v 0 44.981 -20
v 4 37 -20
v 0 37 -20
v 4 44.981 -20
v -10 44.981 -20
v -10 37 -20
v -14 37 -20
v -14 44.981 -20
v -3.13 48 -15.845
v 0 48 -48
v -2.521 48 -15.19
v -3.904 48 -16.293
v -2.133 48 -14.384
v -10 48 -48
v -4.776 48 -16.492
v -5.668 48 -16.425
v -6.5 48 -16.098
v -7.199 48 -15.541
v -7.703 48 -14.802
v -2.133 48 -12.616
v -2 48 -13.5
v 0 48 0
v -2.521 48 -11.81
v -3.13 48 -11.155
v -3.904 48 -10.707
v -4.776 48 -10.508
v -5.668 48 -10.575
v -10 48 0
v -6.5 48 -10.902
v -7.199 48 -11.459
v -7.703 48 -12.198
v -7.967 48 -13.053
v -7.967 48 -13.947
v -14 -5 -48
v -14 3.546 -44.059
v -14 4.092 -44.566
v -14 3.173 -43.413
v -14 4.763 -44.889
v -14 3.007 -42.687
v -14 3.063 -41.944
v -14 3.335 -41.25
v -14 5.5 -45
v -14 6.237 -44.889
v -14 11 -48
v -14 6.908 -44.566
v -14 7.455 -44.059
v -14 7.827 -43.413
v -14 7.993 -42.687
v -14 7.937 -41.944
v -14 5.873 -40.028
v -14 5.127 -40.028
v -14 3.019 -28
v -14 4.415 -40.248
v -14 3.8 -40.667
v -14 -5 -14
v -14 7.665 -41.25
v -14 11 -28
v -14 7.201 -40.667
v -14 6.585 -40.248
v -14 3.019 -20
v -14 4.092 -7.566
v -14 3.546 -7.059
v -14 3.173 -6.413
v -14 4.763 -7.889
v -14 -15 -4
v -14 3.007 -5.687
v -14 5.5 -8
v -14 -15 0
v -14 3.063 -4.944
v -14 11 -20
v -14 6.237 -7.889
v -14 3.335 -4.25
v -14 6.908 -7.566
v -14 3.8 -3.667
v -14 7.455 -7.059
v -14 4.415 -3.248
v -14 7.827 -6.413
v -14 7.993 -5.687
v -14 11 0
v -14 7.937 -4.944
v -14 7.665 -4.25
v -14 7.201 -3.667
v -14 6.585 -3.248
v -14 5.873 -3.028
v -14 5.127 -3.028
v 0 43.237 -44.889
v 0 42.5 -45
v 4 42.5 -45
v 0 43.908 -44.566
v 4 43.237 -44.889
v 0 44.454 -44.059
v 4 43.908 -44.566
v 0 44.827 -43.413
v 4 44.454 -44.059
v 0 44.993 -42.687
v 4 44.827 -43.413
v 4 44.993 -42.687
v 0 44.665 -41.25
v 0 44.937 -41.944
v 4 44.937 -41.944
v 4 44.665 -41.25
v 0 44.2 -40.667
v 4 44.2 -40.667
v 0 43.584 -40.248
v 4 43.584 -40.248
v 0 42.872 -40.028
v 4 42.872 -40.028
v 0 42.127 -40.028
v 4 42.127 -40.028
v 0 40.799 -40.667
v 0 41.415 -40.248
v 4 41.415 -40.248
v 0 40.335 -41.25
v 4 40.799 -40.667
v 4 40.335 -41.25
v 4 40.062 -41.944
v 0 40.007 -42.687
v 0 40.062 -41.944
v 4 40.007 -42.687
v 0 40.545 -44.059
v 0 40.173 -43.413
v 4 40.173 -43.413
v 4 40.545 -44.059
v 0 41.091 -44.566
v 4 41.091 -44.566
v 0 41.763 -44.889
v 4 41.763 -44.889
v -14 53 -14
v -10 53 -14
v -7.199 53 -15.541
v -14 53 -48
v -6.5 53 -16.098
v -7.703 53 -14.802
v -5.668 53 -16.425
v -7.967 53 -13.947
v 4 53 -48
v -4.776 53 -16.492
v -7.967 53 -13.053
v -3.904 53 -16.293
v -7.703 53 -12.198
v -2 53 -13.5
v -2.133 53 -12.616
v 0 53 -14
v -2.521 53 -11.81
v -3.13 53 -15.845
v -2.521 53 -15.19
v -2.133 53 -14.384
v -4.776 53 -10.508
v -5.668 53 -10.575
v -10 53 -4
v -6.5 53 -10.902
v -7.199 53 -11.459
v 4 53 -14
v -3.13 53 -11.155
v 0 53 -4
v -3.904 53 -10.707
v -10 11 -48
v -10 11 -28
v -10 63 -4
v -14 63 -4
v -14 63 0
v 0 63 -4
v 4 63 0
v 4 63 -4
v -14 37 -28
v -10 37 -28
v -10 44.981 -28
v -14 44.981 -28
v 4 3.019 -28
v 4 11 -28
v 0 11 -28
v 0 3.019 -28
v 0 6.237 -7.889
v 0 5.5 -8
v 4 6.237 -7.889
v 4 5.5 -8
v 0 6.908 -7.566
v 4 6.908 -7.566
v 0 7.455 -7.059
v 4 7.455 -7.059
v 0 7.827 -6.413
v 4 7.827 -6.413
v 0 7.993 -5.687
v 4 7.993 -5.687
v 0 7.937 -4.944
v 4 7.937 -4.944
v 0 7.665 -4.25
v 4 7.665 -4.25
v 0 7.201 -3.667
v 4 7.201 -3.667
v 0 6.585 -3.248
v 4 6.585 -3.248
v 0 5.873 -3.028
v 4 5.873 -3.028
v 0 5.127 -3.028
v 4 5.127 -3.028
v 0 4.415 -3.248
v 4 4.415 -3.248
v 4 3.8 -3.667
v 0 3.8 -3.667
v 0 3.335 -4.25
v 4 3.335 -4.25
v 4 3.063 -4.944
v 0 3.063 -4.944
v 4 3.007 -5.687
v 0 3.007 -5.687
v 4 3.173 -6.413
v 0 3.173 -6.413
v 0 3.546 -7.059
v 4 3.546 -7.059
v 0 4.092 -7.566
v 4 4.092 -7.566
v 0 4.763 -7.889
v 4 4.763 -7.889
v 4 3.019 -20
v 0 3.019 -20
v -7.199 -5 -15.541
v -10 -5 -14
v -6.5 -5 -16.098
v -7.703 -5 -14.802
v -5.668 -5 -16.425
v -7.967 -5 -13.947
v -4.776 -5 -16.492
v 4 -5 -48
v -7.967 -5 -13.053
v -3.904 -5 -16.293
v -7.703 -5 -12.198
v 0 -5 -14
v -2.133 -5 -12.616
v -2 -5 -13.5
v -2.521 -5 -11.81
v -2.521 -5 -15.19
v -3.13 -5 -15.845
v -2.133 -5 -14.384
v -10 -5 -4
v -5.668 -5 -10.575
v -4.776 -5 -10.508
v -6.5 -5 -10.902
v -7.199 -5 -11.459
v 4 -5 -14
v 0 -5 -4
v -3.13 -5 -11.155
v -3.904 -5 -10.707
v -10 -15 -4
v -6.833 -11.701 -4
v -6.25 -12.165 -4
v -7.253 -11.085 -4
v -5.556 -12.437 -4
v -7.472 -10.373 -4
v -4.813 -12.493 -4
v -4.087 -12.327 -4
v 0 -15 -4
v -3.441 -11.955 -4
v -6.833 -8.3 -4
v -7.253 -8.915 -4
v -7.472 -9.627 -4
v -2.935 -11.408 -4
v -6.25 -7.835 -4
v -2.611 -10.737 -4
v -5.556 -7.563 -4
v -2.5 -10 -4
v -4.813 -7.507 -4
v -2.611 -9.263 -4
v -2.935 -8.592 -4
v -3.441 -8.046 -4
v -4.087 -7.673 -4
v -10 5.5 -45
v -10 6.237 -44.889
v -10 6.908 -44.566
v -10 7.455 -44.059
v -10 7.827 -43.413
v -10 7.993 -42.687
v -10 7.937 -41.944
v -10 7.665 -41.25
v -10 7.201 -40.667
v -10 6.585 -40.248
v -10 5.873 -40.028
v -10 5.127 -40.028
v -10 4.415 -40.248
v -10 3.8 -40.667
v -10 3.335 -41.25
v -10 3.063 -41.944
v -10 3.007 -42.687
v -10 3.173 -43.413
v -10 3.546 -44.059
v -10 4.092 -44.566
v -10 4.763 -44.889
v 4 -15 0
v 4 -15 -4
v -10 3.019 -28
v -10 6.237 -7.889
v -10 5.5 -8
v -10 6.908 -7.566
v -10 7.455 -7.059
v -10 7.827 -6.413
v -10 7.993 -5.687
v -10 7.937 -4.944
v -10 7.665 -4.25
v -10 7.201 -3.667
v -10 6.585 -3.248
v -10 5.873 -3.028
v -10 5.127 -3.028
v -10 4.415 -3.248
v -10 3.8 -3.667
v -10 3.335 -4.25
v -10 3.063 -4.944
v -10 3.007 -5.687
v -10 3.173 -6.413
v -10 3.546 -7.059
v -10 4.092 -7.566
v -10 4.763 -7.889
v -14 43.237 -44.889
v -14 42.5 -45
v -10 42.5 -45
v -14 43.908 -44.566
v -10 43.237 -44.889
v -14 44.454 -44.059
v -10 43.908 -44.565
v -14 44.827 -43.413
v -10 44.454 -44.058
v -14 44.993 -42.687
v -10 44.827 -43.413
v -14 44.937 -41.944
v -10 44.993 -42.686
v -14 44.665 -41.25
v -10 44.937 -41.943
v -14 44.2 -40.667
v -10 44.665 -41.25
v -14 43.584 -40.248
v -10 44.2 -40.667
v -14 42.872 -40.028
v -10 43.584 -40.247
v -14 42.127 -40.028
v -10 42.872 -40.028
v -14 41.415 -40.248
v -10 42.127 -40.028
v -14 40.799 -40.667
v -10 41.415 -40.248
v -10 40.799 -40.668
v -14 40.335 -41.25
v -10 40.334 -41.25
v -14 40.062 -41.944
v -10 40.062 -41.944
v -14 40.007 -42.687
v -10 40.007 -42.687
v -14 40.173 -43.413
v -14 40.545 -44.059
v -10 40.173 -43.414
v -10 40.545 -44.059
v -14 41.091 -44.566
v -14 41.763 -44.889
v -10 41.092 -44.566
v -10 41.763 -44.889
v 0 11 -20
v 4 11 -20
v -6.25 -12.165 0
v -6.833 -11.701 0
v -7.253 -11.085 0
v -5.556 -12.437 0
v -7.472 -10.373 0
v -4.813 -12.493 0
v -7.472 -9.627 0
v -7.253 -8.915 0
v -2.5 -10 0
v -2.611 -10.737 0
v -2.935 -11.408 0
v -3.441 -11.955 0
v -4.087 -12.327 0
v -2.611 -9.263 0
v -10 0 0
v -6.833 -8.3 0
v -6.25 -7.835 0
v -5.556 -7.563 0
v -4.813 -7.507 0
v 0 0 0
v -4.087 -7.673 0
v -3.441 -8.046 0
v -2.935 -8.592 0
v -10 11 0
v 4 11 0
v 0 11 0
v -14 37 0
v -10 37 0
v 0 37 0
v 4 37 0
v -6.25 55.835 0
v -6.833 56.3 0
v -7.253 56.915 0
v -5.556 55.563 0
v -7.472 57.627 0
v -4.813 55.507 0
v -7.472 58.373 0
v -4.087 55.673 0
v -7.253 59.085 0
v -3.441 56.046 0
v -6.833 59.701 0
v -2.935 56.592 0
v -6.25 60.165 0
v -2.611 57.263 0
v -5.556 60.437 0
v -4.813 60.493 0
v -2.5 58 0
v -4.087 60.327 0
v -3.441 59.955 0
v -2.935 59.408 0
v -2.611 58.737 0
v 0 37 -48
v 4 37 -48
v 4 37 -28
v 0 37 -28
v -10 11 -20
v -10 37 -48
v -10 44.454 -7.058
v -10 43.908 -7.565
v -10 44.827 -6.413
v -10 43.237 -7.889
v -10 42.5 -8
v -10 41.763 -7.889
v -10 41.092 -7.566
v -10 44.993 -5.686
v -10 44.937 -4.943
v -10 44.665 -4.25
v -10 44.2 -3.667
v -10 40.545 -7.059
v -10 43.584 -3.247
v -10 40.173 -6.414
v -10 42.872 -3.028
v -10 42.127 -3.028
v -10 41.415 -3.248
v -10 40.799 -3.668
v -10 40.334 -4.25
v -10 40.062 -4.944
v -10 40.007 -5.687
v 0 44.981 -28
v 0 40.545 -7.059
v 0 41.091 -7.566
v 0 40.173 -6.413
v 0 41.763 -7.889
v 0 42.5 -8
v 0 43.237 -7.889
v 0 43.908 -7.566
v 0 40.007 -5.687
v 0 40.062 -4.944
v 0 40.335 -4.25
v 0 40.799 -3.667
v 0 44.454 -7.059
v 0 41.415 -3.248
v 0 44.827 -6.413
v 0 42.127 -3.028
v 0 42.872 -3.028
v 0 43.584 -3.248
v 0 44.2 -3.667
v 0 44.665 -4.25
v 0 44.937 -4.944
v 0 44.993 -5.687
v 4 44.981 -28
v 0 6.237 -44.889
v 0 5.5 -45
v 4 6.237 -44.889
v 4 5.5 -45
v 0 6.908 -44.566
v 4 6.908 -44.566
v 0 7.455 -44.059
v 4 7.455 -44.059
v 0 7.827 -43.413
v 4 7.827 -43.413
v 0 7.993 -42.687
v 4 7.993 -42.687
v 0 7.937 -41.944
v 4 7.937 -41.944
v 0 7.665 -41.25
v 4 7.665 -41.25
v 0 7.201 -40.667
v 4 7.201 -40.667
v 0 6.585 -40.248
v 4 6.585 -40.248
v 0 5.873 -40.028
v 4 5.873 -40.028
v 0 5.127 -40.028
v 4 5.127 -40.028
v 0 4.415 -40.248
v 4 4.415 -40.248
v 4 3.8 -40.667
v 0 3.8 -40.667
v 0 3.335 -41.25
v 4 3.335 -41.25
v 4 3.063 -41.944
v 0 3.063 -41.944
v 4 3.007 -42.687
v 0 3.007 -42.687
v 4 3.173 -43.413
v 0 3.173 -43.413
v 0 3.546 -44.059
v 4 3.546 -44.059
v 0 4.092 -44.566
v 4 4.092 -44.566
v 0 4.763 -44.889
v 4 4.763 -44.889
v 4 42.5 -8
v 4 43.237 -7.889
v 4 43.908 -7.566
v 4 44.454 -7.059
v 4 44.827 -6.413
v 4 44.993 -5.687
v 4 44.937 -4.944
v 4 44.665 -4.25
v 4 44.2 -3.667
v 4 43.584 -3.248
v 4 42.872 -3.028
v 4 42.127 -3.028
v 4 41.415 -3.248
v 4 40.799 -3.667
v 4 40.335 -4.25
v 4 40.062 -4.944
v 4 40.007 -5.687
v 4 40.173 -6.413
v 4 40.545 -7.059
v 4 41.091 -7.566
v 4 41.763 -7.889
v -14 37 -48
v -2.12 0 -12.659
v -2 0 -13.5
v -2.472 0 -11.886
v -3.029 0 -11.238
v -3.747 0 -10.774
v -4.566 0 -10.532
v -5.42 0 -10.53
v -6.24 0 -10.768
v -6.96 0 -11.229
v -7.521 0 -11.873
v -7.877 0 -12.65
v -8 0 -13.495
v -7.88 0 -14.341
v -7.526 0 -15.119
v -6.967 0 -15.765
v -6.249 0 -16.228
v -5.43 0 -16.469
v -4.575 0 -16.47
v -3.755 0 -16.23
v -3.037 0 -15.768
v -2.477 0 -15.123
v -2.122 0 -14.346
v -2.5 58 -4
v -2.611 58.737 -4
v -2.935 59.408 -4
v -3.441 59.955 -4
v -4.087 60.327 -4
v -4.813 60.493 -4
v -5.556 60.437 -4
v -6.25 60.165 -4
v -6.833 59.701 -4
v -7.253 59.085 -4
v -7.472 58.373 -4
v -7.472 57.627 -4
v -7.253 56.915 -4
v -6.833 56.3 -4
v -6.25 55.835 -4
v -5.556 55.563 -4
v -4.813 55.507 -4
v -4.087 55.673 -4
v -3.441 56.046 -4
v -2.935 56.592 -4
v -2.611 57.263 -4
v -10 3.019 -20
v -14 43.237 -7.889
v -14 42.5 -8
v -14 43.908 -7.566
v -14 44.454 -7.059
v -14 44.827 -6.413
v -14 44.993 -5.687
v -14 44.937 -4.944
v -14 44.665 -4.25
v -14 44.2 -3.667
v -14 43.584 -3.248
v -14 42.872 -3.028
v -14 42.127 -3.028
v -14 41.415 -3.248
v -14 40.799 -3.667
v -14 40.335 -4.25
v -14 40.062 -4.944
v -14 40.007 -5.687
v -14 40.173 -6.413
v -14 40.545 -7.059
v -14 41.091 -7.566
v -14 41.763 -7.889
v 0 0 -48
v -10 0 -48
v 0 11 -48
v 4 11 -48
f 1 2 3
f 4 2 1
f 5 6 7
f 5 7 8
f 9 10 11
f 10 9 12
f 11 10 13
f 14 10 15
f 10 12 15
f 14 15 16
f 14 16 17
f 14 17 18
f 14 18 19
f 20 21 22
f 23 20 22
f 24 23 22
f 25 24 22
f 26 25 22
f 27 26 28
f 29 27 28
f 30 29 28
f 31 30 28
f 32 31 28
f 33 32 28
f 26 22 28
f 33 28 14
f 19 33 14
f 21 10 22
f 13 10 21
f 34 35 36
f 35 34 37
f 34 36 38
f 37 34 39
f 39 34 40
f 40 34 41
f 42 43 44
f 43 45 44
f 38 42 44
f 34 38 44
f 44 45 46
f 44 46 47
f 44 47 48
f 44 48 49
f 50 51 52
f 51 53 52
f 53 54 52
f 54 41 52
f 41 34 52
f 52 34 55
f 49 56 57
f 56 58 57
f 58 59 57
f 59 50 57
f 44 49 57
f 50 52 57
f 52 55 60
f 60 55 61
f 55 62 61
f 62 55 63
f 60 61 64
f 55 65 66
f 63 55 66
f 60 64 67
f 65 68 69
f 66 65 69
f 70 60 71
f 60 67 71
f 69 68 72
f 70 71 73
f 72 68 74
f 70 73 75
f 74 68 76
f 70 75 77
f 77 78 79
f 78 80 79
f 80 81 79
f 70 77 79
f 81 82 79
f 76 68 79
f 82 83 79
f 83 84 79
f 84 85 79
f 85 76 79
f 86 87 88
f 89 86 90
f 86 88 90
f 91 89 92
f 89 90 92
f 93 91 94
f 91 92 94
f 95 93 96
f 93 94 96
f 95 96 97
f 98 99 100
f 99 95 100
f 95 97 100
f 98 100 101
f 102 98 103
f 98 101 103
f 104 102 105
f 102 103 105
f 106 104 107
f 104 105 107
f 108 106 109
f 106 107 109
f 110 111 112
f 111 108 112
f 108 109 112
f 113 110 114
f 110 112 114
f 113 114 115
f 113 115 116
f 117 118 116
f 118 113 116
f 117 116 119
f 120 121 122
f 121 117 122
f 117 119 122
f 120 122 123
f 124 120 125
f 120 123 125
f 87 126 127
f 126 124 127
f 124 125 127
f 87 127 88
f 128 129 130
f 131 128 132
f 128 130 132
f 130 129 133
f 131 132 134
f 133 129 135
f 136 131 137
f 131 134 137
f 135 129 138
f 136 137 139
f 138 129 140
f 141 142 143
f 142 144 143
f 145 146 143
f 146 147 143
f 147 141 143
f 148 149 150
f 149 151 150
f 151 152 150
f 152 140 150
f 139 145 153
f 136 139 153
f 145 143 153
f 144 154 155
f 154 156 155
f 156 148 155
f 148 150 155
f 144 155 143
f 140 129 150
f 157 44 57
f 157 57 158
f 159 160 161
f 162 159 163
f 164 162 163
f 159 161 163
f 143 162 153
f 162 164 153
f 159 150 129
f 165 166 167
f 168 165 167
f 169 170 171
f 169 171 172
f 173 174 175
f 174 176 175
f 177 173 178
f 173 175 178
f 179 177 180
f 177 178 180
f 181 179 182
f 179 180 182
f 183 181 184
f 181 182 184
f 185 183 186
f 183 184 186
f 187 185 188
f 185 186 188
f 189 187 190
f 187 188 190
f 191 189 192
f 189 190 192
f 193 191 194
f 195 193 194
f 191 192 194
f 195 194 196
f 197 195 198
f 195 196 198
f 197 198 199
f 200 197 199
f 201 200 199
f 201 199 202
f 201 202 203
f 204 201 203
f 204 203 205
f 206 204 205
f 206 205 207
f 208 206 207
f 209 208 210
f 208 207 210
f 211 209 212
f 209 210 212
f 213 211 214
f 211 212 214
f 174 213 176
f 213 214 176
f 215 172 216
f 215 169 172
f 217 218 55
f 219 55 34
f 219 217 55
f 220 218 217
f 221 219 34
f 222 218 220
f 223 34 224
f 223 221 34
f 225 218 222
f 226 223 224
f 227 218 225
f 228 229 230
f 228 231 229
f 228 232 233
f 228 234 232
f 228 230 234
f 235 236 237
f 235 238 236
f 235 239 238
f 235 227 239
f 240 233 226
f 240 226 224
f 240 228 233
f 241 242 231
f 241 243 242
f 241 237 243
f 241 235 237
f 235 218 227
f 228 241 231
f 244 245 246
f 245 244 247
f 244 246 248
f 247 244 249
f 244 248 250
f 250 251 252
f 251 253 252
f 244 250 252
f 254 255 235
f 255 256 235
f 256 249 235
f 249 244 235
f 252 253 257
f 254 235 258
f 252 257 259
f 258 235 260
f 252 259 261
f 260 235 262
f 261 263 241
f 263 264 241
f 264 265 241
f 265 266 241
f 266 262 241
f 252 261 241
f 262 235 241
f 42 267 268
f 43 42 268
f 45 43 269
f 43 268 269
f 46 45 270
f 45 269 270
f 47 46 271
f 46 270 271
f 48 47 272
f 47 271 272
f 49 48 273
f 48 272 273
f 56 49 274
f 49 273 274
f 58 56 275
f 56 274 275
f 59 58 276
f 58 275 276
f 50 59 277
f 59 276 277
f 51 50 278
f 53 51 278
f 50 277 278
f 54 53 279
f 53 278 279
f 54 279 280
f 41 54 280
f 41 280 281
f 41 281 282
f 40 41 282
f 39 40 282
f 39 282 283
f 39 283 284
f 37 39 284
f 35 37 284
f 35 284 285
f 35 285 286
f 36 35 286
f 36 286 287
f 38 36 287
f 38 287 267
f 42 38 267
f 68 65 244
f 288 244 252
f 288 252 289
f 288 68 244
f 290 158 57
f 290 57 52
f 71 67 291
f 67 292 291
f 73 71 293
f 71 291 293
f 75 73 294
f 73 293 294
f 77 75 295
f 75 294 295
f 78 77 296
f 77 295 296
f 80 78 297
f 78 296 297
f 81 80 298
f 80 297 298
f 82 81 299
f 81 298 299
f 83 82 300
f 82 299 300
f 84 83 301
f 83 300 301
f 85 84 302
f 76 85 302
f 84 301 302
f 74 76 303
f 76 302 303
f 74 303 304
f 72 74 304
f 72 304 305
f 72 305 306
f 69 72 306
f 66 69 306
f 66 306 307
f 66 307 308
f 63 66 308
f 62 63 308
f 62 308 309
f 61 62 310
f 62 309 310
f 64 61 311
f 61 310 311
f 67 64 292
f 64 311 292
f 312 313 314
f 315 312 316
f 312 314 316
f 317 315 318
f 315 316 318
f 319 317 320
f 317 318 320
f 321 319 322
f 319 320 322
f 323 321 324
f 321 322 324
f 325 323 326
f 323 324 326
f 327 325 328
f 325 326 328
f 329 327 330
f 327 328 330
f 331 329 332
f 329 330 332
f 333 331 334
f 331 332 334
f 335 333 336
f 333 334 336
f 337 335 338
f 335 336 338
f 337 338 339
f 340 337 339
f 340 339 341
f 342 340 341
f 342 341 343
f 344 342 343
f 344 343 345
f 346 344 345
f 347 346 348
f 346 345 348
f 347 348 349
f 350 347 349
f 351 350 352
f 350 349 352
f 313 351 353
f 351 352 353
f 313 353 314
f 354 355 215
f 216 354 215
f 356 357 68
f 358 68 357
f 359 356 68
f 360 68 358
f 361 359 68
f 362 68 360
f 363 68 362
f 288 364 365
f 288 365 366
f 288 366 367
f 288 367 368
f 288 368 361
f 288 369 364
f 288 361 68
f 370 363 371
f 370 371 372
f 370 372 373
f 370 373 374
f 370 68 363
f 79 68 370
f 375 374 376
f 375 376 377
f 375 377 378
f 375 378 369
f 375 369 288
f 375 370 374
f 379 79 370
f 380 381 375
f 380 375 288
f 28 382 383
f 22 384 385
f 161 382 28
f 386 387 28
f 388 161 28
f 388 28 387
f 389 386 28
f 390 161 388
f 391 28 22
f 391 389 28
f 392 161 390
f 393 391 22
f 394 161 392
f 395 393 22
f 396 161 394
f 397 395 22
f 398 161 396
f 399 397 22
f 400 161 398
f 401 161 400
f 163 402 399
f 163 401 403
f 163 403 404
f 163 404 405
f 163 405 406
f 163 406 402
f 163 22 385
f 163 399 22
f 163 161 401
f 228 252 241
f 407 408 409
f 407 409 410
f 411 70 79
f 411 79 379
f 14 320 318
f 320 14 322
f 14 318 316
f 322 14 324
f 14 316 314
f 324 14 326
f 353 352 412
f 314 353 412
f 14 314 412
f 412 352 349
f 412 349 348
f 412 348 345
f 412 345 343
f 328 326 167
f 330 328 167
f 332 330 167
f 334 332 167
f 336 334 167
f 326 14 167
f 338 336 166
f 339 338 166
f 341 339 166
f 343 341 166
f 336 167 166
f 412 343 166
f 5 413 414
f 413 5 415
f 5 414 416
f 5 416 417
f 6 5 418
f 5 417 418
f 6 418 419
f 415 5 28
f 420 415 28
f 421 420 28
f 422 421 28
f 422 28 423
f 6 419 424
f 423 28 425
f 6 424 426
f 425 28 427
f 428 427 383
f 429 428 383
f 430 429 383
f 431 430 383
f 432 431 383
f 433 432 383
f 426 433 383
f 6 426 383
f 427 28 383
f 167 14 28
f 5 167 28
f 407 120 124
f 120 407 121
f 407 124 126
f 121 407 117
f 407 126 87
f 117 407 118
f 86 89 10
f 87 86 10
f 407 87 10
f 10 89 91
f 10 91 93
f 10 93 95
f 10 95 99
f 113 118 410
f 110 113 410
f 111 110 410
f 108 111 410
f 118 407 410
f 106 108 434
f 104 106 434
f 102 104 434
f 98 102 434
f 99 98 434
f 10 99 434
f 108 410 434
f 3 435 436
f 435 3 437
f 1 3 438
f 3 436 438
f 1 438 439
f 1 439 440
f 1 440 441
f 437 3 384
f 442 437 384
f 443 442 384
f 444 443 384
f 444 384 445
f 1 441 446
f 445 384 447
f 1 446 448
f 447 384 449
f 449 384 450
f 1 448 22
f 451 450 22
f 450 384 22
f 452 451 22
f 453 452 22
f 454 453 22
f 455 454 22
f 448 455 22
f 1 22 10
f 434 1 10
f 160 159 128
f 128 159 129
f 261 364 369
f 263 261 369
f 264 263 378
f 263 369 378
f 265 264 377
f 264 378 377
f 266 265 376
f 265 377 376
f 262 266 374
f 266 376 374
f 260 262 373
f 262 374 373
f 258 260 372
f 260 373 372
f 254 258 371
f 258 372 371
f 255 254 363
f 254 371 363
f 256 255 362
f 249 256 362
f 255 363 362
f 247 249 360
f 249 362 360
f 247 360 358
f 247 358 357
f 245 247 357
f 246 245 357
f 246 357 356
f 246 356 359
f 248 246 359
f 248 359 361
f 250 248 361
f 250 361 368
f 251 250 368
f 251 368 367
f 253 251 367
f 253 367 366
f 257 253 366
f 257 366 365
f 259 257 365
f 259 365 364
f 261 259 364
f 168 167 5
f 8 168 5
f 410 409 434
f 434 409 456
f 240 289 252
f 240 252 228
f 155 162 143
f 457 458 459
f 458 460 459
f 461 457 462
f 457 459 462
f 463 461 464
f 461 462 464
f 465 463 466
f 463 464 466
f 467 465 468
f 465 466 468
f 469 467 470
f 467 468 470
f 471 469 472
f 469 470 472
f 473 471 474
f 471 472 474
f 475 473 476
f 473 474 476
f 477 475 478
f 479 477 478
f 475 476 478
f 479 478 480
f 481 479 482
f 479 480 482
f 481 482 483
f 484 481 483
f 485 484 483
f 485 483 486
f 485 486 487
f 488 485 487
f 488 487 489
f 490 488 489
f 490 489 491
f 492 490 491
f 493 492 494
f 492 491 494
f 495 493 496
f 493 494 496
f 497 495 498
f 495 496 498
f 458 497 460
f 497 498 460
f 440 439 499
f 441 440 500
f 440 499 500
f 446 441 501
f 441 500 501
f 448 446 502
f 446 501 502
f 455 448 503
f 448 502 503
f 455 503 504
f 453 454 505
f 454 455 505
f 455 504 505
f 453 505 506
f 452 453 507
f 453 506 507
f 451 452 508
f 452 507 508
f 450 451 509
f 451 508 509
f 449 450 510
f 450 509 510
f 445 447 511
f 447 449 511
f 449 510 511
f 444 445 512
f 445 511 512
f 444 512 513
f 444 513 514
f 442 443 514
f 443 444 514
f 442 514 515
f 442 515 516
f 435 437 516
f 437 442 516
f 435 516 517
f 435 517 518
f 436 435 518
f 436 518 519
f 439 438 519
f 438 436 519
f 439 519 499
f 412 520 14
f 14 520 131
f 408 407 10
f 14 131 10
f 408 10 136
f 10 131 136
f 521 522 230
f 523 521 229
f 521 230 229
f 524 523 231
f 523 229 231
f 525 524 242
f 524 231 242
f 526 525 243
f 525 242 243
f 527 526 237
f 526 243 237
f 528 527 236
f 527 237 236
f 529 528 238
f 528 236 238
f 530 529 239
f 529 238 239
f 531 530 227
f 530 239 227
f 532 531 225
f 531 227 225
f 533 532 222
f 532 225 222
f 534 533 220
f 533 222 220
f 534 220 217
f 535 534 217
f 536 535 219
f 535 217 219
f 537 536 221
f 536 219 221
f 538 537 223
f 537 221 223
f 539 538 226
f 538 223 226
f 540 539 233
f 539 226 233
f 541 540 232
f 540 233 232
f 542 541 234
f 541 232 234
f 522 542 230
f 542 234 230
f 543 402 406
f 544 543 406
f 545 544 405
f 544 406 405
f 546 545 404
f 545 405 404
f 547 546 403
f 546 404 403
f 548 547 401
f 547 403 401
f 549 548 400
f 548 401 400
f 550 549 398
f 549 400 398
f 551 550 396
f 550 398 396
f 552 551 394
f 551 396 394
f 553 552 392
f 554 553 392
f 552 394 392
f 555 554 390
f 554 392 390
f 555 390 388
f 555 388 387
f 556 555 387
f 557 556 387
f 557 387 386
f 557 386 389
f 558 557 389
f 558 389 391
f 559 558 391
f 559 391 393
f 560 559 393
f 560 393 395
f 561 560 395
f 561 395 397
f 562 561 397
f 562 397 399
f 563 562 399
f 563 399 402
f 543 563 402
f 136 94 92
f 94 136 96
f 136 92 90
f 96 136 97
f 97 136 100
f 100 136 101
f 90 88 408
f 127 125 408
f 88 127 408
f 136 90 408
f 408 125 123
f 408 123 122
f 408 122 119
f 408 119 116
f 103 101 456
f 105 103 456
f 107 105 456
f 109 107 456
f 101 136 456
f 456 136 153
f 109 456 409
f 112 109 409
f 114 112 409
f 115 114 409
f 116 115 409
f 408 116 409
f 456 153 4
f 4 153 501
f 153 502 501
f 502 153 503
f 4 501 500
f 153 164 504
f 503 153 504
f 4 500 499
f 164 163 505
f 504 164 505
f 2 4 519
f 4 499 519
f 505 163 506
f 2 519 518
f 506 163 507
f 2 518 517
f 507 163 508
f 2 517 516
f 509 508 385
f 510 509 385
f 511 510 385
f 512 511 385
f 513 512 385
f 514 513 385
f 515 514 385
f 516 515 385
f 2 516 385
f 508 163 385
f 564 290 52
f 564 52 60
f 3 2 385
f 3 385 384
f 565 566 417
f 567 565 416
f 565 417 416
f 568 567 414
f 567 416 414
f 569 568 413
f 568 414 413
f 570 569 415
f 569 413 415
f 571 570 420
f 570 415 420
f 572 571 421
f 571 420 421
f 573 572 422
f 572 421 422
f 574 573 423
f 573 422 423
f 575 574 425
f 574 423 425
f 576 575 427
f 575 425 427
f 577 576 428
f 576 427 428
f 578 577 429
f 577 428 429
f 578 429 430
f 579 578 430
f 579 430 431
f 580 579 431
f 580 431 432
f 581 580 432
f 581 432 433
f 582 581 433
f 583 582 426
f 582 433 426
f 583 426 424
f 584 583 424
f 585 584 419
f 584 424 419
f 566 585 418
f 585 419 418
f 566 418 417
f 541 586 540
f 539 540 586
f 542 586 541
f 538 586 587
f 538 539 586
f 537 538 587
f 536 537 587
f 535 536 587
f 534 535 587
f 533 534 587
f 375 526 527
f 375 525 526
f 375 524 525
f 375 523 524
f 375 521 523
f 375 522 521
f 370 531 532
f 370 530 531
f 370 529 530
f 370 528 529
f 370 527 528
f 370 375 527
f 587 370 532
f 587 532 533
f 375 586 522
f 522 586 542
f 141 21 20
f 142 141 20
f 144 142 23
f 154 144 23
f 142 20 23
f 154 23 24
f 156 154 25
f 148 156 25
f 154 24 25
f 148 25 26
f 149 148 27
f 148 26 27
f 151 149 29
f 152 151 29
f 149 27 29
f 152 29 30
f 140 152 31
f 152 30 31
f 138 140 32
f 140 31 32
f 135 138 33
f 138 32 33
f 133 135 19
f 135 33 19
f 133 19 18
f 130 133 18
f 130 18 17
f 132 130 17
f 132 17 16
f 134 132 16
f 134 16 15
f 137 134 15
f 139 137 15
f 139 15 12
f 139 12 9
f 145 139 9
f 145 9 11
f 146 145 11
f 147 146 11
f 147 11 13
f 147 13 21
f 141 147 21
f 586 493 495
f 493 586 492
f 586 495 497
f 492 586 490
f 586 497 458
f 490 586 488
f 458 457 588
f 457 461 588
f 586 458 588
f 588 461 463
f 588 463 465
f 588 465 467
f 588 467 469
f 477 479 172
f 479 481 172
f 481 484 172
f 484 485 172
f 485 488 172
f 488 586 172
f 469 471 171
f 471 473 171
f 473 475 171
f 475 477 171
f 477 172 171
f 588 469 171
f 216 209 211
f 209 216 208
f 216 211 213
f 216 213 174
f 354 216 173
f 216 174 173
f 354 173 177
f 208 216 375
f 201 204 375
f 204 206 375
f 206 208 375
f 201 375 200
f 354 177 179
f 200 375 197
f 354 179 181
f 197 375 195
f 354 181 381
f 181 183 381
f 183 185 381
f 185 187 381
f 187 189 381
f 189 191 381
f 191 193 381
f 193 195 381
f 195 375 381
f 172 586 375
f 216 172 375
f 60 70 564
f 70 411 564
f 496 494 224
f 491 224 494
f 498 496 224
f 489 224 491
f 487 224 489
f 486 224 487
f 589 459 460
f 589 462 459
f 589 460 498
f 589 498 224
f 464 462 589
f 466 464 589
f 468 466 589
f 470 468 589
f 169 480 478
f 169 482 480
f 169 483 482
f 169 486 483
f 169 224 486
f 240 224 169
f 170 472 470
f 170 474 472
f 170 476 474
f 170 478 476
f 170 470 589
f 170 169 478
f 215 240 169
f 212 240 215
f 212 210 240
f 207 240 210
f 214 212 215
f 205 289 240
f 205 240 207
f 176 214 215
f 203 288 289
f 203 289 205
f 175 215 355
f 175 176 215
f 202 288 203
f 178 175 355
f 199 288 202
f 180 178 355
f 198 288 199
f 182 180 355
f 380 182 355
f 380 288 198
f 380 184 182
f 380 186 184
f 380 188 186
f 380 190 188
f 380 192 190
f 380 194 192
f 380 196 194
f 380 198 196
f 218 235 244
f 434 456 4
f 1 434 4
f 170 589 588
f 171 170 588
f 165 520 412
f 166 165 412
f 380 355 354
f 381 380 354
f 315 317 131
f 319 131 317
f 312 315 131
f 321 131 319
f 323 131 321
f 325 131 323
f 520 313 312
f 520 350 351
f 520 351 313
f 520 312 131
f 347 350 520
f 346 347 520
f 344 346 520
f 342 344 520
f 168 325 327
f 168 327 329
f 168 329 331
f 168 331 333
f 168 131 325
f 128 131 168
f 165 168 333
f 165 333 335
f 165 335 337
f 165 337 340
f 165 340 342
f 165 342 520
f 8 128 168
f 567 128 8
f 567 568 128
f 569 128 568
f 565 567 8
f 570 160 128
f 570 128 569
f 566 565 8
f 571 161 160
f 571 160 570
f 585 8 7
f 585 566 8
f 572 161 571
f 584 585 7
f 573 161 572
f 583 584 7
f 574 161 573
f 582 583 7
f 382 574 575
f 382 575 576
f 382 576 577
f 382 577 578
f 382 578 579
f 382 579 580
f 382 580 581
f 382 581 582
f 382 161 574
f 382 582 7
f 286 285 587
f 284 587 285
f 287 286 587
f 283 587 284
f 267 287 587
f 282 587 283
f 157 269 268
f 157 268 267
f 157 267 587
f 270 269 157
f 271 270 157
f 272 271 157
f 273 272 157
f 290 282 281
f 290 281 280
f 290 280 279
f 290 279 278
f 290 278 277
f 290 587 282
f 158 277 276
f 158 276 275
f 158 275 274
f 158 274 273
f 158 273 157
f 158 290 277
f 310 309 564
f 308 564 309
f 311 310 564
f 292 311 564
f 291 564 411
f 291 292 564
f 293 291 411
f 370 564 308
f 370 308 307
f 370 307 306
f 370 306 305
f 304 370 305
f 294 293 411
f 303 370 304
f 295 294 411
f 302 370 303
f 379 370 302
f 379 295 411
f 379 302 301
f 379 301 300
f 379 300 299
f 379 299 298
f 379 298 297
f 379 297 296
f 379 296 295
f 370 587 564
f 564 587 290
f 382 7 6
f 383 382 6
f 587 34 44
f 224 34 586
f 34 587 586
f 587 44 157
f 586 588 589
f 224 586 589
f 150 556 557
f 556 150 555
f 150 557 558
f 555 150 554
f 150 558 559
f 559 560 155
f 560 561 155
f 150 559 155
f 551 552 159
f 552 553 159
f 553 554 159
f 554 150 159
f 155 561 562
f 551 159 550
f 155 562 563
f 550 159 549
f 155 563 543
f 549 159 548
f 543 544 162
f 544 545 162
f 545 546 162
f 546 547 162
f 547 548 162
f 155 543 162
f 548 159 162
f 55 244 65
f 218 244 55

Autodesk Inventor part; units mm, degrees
ref_plane "YZ Plane" through (0, 0, 0) normal (1, 0, 0) x (0, 1, 0)
ref_plane "XZ Plane" through (0, 0, 0) normal (0, 1, 0) x (-1, 0, 0)
ref_plane "XY Plane" through (0, 0, 0) normal (0, 0, 1) x (1, 0, 0)
sketch "Sketch3" plane through (0, 0, 0) normal (0, 0, 1) x (1, 0, 0)
  line L0 (-0.0001, 48.0001) -> (-10.0001, 48.0001)
  line L1 (-0.0001, 42.5001) -> (-0.0001, 48.0001)
  line L2 (-0.0001, 5.5001) -> (-0.0001, 42.5001)
  line L3 (-0.0001, 0) -> (-0.0001, 5.5001)
  line L4 (-10, 3) -> (0, 3)
  line L5 (-10.0001, 5.5001) -> (-10.0001, 42.5001)
  line L6 (-10.0001, 5.5001) -> (-10.0001, 0.0001)
  line L7 (-10.0001, 48.0001) -> (-10.0001, 42.5001)
  line L8 (-0.0001, 48.0001) -> (-10, 48.0001)
  line L9 (-10, 48.0001) -> (-10, 53.0001)
  line L10 (-10, 53.0001) -> (-0.0001, 53.0001)
  line L11 (-0.0001, 53.0001) -> (-0.0001, 48.0001)
  line L12 (-10, 3) -> (0, 3)
  line L13 (0, 3) -> (0, -2)
  line L14 (0, -2) -> (-10, -2)
  line L15 (-10, -2) -> (-10, 3)
  line L16 (-10, 53.0001) -> (-14, 53.0001)
  line L17 (-14, 53.0001) -> (-14, 37.0001)
  line L18 (-14, 37.0001) -> (-10, 37.0001)
  line L19 (-10, 37.0001) -> (-10, 53.0001)
  line L20 (0, 24) -> (-10, 24)
  line L21 (-0.0001, 53.0001) -> (3.9999, 53.0001)
  line L22 (3.9999, 53.0001) -> (3.9999, 37.0001)
  line L23 (3.9999, 37.0001) -> (-0.0001, 37.0001)
  line L24 (-0.0001, 37.0001) -> (-0.0001, 53.0001)
  line L25 (0, 0) -> (-10.0001, -0.0001)
  line L26 (-0.0001, 5.5001) -> (0, 0)
  line L27 (-10.0001, -0.0001) -> (-10.0001, 5.5001)
  line L28 (0, 0) -> (-10, -0.0001)
  line L29 (-10, -0.0001) -> (-10, -5.0001)
  line L30 (-10, -5.0001) -> (-0.0001, -5.0001)
  line L31 (-0.0001, -5.0001) -> (0, 0)
  line L32 (-10, -5.0001) -> (-14, -5.0001)
  line L33 (-14, -5.0001) -> (-14, 10.9999)
  line L34 (-14, 10.9999) -> (-10, 10.9999)
  line L35 (-10, 10.9999) -> (-10, -5.0001)
  line L36 (-0.0001, -5.0001) -> (3.9999, -5.0001)
  line L37 (3.9999, -5.0001) -> (3.9999, 10.9999)
  line L38 (3.9999, 10.9999) -> (-0.0001, 10.9999)
  line L39 (-0.0001, 10.9999) -> (-0.0001, -5.0001)
  point P0 (-10.0001, 0.0001)
  point P1 (-0.0001, 10.9999)
  point P2 (-10, 0)
  point P3 (-10.0001, 10.9999)
  point P4 (-10.0001, 37.0001)
  point P5 (-0.0001, 37.0001)
  point P6 (-0.0001, 0)
  point P7 (-10.0001, 0.0001)
  point P8 (-10, -0.0001)
extrude "Extrusion1" add sketch "Sketch3" against normal blind 48 contours L11 L21 L22 L23 L2 L1 | L0 L9 L10 L11 | L7 L5 L18 L17 L16 L9 | L38 L37 L36 L31 L13 L3 L2 | L5 L6 L15 L29 L32 L33 L34 | L13 L14 L15 L25 | L30 L29 L14 L31
sketch "Sketch4" plane through (3.9999, -5.0001, 0) normal (1, 0, 0) x (0, 0, -1)
  line L0 (22, 27.0002) -> (22, 10.0002) projected
  line L1 (26, 27.0002) -> (26, 10.0002) projected
  circle A0 centre (5.5, 10.5002) radius 2.5 projected
  circle A1 centre (42.5, 10.5002) radius 2.5 projected
  line L2 (22, 10) -> (26, 10) projected
  line L3 (-9.6, 29) -> (57.6, 29)
  line L4 (-9.6, 29) -> (57.6, 29)
  line L5 (22, 16.019) -> (20, 16.019)
  line L6 (20, 16.019) -> (20, 8.019)
  line L7 (26, 16.019) -> (28, 16.019)
  line L8 (28, 16.019) -> (28, 8.019)
  line L9 (28, 8.019) -> (20, 8.019)
  line L10 (20, 16.019) -> (28, 16.019)
  circle A2 centre (5.5, 47.4998) radius 2.5
  circle A3 centre (42.5, 47.4998) radius 2.5
  line L11 (20, 41.981) -> (20, 49.981)
  line L12 (28, 41.981) -> (28, 49.981)
  line L13 (28, 49.981) -> (20, 49.981)
  line L14 (20, 41.981) -> (28, 41.981)
  point P0 (0, 5.0001)
  point P1 (26, 41.981)
  dimension "d8" = 2
  dimension "d9" = 8
  dimension "d10" = 2
extrude "Extrusion2" cut sketch "Sketch4" against normal through all
sketch "Sketch5" plane through (0, 0, 0) normal (0, 0, 1) x (1, 0, 0)
  line L0 (3.9999, -5.0001) -> (-14, -5.0001) projected
  line L1 (-103.5812, 24) -> (13.5812, 24)
  line L2 (7.6307, 24) -> (-16.2188, 24)
  line L3 (-5.0001, -5.0001) -> (-5.0001, -15.0001)
  line L4 (-0.0001, -5.0001) -> (-0.0001, -15.0001)
  line L5 (-0.0001, -15.0001) -> (-10.0001, -15.0001)
  line L6 (-10.0001, -15.0001) -> (-10.0001, -5.0001)
  line L7 (-10.0001, -5.0001) -> (-0.0001, -5.0001)
  line L8 (-0.0001, -5.0001) -> (-10.0001, -15.0001) construction
  line L9 (-0.0001, -15.0001) -> (-10.0001, -5.0001) construction
  circle A0 centre (-5.0001, -10.0001) radius 2.5
  line L10 (-0.0001, -15.0001) -> (3.9999, -15.0001)
  line L11 (3.9999, -15.0001) -> (3.9999, -5.0001)
  line L12 (3.9999, -5.0001) -> (-0.0001, -5.0001)
  line L13 (-0.0001, -5.0001) -> (-0.0001, -15.0001)
  line L14 (-10.0001, -15.0001) -> (-14, -15.0001)
  line L15 (-14, -15.0001) -> (-14, -5.0001)
  line L16 (-14, -5.0001) -> (-10.0001, -5.0001)
  line L17 (-10.0001, -5.0001) -> (-10.0001, -15.0001)
  line L18 (3.9999, 53.0001) -> (-14, 53.0001)
  line L19 (-5.0001, 53.0001) -> (-5.0001, 63.0001)
  line L20 (-0.0001, 53.0001) -> (-0.0001, 63.0001)
  line L21 (-0.0001, 63.0001) -> (-10.0001, 63.0001)
  line L22 (-10.0001, 63.0001) -> (-10.0001, 53.0001)
  line L23 (-10.0001, 53.0001) -> (-0.0001, 53.0001)
  line L24 (-0.0001, 53.0001) -> (-10.0001, 63.0001) construction
  line L25 (-0.0001, 63.0001) -> (-10.0001, 53.0001) construction
  circle A1 centre (-5.0001, 58.0001) radius 2.5
  line L26 (-0.0001, 63.0001) -> (3.9999, 63.0001)
  line L27 (3.9999, 63.0001) -> (3.9999, 53.0001)
  line L28 (3.9999, 53.0001) -> (-0.0001, 53.0001)
  line L29 (-0.0001, 53.0001) -> (-0.0001, 63.0001)
  line L30 (-10.0001, 63.0001) -> (-14, 63.0001)
  line L31 (-14, 63.0001) -> (-14, 53.0001)
  line L32 (-14, 53.0001) -> (-10.0001, 53.0001)
  line L33 (-10.0001, 53.0001) -> (-10.0001, 63.0001)
  point P0 (0, 0)
  dimension "d13" = 10
  dimension "d14" = 10
  dimension "d15" = 5
extrude "Extrusion3" add sketch "Sketch5" against normal blind 4 contours L11 L10 L4 L0 | L4 L5 L3 A0 L0 | L3 A0 L5 L6 L0 | L6 L14 L15 L0 | L18 L20 L26 L27 | L18 L19 A1 L21 L20 | L18 L22 L21 L19 A1 | L18 L31 L30 L22
sketch "Sketch6" plane through (0, 0, -4) normal (0, 0, -1) x (-1, 0, 0)
  line L0 (-3.9999, -5.0001) -> (-3.9999, -15.0001) projected
  line L1 (-3.9999, -15.0001) -> (0.0001, -15.0001)
  line L2 (0.0001, -15.0001) -> (0.0001, -5.0001)
  line L3 (0.0001, -5.0001) -> (-3.9999, -5.0001)
  line L4 (-3.9999, -5.0001) -> (-3.9999, -15.0001)
  line L5 (14, 10.9999) -> (14, -15.0001) projected
  line L6 (14, -5.0001) -> (10, -5.0001)
  line L7 (10, -5.0001) -> (10, -15.0001)
  line L8 (10, -15.0001) -> (14, -15.0001)
  line L9 (14, -15.0001) -> (14, -5.0001)
  line L10 (-13.5812, 24) -> (103.5812, 24)
  line L11 (-3.9999, 53.0001) -> (-3.9999, 63.0001)
  line L12 (-3.9999, 63.0001) -> (0.0001, 63.0001)
  line L13 (0.0001, 63.0001) -> (0.0001, 53.0001)
  line L14 (0.0001, 53.0001) -> (-3.9999, 53.0001)
  line L15 (14, 37.0001) -> (14, 63.0001)
  line L16 (14, 53.0001) -> (10, 53.0001)
  line L17 (10, 53.0001) -> (10, 63.0001)
  line L18 (10, 63.0001) -> (14, 63.0001)
  point P0 (0, 0)
  point P1 (-3.9999, -5.0001)
  dimension "d18" = 4
extrude "Extrusion4" add sketch "Sketch6" along normal blind 10
sketch "Sketch7" plane through (3.9999, -5.0001, -48) normal (1, 0, 0) x (0, 0, -1)
  line L0 (-48, -10) -> (-34, -10) projected
  line L1 (-34, -10) -> (-44, -10)
  line L2 (-34, 0) -> (0, 0) projected
  line L3 (-44, -10) -> (-34, 0)
  line L4 (-34, 0) -> (-34, -10) projected
  line L5 (-34, -10) -> (-34, 0)
  line L6 (-34, 68.0002) -> (-34, 58.0002) projected
  line L7 (-34, 58.0002) -> (-34, 68.0002)
  line L8 (-34, 68.0002) -> (-44, 68.0002)
  line L9 (-44, 68.0002) -> (-34, 58.0002)
  point P0 (-48, 5.0001)
  dimension "d21" = 10
  dimension "d22" = 10
extrude "Extrusion5" cut sketch "Sketch7" against normal through all
sketch "Sketch8" plane through (-14, -5.0001, -48) normal (0, -1, 0) x (1, 0, 0)
  circle A0 centre (8.9999, 34.5) radius 3
  point P0 (14, 48)
extrude "Extrusion6" cut sketch "Sketch8" against normal through all
properties part number "2020_guide_adaptor" material "PET Plastic"
